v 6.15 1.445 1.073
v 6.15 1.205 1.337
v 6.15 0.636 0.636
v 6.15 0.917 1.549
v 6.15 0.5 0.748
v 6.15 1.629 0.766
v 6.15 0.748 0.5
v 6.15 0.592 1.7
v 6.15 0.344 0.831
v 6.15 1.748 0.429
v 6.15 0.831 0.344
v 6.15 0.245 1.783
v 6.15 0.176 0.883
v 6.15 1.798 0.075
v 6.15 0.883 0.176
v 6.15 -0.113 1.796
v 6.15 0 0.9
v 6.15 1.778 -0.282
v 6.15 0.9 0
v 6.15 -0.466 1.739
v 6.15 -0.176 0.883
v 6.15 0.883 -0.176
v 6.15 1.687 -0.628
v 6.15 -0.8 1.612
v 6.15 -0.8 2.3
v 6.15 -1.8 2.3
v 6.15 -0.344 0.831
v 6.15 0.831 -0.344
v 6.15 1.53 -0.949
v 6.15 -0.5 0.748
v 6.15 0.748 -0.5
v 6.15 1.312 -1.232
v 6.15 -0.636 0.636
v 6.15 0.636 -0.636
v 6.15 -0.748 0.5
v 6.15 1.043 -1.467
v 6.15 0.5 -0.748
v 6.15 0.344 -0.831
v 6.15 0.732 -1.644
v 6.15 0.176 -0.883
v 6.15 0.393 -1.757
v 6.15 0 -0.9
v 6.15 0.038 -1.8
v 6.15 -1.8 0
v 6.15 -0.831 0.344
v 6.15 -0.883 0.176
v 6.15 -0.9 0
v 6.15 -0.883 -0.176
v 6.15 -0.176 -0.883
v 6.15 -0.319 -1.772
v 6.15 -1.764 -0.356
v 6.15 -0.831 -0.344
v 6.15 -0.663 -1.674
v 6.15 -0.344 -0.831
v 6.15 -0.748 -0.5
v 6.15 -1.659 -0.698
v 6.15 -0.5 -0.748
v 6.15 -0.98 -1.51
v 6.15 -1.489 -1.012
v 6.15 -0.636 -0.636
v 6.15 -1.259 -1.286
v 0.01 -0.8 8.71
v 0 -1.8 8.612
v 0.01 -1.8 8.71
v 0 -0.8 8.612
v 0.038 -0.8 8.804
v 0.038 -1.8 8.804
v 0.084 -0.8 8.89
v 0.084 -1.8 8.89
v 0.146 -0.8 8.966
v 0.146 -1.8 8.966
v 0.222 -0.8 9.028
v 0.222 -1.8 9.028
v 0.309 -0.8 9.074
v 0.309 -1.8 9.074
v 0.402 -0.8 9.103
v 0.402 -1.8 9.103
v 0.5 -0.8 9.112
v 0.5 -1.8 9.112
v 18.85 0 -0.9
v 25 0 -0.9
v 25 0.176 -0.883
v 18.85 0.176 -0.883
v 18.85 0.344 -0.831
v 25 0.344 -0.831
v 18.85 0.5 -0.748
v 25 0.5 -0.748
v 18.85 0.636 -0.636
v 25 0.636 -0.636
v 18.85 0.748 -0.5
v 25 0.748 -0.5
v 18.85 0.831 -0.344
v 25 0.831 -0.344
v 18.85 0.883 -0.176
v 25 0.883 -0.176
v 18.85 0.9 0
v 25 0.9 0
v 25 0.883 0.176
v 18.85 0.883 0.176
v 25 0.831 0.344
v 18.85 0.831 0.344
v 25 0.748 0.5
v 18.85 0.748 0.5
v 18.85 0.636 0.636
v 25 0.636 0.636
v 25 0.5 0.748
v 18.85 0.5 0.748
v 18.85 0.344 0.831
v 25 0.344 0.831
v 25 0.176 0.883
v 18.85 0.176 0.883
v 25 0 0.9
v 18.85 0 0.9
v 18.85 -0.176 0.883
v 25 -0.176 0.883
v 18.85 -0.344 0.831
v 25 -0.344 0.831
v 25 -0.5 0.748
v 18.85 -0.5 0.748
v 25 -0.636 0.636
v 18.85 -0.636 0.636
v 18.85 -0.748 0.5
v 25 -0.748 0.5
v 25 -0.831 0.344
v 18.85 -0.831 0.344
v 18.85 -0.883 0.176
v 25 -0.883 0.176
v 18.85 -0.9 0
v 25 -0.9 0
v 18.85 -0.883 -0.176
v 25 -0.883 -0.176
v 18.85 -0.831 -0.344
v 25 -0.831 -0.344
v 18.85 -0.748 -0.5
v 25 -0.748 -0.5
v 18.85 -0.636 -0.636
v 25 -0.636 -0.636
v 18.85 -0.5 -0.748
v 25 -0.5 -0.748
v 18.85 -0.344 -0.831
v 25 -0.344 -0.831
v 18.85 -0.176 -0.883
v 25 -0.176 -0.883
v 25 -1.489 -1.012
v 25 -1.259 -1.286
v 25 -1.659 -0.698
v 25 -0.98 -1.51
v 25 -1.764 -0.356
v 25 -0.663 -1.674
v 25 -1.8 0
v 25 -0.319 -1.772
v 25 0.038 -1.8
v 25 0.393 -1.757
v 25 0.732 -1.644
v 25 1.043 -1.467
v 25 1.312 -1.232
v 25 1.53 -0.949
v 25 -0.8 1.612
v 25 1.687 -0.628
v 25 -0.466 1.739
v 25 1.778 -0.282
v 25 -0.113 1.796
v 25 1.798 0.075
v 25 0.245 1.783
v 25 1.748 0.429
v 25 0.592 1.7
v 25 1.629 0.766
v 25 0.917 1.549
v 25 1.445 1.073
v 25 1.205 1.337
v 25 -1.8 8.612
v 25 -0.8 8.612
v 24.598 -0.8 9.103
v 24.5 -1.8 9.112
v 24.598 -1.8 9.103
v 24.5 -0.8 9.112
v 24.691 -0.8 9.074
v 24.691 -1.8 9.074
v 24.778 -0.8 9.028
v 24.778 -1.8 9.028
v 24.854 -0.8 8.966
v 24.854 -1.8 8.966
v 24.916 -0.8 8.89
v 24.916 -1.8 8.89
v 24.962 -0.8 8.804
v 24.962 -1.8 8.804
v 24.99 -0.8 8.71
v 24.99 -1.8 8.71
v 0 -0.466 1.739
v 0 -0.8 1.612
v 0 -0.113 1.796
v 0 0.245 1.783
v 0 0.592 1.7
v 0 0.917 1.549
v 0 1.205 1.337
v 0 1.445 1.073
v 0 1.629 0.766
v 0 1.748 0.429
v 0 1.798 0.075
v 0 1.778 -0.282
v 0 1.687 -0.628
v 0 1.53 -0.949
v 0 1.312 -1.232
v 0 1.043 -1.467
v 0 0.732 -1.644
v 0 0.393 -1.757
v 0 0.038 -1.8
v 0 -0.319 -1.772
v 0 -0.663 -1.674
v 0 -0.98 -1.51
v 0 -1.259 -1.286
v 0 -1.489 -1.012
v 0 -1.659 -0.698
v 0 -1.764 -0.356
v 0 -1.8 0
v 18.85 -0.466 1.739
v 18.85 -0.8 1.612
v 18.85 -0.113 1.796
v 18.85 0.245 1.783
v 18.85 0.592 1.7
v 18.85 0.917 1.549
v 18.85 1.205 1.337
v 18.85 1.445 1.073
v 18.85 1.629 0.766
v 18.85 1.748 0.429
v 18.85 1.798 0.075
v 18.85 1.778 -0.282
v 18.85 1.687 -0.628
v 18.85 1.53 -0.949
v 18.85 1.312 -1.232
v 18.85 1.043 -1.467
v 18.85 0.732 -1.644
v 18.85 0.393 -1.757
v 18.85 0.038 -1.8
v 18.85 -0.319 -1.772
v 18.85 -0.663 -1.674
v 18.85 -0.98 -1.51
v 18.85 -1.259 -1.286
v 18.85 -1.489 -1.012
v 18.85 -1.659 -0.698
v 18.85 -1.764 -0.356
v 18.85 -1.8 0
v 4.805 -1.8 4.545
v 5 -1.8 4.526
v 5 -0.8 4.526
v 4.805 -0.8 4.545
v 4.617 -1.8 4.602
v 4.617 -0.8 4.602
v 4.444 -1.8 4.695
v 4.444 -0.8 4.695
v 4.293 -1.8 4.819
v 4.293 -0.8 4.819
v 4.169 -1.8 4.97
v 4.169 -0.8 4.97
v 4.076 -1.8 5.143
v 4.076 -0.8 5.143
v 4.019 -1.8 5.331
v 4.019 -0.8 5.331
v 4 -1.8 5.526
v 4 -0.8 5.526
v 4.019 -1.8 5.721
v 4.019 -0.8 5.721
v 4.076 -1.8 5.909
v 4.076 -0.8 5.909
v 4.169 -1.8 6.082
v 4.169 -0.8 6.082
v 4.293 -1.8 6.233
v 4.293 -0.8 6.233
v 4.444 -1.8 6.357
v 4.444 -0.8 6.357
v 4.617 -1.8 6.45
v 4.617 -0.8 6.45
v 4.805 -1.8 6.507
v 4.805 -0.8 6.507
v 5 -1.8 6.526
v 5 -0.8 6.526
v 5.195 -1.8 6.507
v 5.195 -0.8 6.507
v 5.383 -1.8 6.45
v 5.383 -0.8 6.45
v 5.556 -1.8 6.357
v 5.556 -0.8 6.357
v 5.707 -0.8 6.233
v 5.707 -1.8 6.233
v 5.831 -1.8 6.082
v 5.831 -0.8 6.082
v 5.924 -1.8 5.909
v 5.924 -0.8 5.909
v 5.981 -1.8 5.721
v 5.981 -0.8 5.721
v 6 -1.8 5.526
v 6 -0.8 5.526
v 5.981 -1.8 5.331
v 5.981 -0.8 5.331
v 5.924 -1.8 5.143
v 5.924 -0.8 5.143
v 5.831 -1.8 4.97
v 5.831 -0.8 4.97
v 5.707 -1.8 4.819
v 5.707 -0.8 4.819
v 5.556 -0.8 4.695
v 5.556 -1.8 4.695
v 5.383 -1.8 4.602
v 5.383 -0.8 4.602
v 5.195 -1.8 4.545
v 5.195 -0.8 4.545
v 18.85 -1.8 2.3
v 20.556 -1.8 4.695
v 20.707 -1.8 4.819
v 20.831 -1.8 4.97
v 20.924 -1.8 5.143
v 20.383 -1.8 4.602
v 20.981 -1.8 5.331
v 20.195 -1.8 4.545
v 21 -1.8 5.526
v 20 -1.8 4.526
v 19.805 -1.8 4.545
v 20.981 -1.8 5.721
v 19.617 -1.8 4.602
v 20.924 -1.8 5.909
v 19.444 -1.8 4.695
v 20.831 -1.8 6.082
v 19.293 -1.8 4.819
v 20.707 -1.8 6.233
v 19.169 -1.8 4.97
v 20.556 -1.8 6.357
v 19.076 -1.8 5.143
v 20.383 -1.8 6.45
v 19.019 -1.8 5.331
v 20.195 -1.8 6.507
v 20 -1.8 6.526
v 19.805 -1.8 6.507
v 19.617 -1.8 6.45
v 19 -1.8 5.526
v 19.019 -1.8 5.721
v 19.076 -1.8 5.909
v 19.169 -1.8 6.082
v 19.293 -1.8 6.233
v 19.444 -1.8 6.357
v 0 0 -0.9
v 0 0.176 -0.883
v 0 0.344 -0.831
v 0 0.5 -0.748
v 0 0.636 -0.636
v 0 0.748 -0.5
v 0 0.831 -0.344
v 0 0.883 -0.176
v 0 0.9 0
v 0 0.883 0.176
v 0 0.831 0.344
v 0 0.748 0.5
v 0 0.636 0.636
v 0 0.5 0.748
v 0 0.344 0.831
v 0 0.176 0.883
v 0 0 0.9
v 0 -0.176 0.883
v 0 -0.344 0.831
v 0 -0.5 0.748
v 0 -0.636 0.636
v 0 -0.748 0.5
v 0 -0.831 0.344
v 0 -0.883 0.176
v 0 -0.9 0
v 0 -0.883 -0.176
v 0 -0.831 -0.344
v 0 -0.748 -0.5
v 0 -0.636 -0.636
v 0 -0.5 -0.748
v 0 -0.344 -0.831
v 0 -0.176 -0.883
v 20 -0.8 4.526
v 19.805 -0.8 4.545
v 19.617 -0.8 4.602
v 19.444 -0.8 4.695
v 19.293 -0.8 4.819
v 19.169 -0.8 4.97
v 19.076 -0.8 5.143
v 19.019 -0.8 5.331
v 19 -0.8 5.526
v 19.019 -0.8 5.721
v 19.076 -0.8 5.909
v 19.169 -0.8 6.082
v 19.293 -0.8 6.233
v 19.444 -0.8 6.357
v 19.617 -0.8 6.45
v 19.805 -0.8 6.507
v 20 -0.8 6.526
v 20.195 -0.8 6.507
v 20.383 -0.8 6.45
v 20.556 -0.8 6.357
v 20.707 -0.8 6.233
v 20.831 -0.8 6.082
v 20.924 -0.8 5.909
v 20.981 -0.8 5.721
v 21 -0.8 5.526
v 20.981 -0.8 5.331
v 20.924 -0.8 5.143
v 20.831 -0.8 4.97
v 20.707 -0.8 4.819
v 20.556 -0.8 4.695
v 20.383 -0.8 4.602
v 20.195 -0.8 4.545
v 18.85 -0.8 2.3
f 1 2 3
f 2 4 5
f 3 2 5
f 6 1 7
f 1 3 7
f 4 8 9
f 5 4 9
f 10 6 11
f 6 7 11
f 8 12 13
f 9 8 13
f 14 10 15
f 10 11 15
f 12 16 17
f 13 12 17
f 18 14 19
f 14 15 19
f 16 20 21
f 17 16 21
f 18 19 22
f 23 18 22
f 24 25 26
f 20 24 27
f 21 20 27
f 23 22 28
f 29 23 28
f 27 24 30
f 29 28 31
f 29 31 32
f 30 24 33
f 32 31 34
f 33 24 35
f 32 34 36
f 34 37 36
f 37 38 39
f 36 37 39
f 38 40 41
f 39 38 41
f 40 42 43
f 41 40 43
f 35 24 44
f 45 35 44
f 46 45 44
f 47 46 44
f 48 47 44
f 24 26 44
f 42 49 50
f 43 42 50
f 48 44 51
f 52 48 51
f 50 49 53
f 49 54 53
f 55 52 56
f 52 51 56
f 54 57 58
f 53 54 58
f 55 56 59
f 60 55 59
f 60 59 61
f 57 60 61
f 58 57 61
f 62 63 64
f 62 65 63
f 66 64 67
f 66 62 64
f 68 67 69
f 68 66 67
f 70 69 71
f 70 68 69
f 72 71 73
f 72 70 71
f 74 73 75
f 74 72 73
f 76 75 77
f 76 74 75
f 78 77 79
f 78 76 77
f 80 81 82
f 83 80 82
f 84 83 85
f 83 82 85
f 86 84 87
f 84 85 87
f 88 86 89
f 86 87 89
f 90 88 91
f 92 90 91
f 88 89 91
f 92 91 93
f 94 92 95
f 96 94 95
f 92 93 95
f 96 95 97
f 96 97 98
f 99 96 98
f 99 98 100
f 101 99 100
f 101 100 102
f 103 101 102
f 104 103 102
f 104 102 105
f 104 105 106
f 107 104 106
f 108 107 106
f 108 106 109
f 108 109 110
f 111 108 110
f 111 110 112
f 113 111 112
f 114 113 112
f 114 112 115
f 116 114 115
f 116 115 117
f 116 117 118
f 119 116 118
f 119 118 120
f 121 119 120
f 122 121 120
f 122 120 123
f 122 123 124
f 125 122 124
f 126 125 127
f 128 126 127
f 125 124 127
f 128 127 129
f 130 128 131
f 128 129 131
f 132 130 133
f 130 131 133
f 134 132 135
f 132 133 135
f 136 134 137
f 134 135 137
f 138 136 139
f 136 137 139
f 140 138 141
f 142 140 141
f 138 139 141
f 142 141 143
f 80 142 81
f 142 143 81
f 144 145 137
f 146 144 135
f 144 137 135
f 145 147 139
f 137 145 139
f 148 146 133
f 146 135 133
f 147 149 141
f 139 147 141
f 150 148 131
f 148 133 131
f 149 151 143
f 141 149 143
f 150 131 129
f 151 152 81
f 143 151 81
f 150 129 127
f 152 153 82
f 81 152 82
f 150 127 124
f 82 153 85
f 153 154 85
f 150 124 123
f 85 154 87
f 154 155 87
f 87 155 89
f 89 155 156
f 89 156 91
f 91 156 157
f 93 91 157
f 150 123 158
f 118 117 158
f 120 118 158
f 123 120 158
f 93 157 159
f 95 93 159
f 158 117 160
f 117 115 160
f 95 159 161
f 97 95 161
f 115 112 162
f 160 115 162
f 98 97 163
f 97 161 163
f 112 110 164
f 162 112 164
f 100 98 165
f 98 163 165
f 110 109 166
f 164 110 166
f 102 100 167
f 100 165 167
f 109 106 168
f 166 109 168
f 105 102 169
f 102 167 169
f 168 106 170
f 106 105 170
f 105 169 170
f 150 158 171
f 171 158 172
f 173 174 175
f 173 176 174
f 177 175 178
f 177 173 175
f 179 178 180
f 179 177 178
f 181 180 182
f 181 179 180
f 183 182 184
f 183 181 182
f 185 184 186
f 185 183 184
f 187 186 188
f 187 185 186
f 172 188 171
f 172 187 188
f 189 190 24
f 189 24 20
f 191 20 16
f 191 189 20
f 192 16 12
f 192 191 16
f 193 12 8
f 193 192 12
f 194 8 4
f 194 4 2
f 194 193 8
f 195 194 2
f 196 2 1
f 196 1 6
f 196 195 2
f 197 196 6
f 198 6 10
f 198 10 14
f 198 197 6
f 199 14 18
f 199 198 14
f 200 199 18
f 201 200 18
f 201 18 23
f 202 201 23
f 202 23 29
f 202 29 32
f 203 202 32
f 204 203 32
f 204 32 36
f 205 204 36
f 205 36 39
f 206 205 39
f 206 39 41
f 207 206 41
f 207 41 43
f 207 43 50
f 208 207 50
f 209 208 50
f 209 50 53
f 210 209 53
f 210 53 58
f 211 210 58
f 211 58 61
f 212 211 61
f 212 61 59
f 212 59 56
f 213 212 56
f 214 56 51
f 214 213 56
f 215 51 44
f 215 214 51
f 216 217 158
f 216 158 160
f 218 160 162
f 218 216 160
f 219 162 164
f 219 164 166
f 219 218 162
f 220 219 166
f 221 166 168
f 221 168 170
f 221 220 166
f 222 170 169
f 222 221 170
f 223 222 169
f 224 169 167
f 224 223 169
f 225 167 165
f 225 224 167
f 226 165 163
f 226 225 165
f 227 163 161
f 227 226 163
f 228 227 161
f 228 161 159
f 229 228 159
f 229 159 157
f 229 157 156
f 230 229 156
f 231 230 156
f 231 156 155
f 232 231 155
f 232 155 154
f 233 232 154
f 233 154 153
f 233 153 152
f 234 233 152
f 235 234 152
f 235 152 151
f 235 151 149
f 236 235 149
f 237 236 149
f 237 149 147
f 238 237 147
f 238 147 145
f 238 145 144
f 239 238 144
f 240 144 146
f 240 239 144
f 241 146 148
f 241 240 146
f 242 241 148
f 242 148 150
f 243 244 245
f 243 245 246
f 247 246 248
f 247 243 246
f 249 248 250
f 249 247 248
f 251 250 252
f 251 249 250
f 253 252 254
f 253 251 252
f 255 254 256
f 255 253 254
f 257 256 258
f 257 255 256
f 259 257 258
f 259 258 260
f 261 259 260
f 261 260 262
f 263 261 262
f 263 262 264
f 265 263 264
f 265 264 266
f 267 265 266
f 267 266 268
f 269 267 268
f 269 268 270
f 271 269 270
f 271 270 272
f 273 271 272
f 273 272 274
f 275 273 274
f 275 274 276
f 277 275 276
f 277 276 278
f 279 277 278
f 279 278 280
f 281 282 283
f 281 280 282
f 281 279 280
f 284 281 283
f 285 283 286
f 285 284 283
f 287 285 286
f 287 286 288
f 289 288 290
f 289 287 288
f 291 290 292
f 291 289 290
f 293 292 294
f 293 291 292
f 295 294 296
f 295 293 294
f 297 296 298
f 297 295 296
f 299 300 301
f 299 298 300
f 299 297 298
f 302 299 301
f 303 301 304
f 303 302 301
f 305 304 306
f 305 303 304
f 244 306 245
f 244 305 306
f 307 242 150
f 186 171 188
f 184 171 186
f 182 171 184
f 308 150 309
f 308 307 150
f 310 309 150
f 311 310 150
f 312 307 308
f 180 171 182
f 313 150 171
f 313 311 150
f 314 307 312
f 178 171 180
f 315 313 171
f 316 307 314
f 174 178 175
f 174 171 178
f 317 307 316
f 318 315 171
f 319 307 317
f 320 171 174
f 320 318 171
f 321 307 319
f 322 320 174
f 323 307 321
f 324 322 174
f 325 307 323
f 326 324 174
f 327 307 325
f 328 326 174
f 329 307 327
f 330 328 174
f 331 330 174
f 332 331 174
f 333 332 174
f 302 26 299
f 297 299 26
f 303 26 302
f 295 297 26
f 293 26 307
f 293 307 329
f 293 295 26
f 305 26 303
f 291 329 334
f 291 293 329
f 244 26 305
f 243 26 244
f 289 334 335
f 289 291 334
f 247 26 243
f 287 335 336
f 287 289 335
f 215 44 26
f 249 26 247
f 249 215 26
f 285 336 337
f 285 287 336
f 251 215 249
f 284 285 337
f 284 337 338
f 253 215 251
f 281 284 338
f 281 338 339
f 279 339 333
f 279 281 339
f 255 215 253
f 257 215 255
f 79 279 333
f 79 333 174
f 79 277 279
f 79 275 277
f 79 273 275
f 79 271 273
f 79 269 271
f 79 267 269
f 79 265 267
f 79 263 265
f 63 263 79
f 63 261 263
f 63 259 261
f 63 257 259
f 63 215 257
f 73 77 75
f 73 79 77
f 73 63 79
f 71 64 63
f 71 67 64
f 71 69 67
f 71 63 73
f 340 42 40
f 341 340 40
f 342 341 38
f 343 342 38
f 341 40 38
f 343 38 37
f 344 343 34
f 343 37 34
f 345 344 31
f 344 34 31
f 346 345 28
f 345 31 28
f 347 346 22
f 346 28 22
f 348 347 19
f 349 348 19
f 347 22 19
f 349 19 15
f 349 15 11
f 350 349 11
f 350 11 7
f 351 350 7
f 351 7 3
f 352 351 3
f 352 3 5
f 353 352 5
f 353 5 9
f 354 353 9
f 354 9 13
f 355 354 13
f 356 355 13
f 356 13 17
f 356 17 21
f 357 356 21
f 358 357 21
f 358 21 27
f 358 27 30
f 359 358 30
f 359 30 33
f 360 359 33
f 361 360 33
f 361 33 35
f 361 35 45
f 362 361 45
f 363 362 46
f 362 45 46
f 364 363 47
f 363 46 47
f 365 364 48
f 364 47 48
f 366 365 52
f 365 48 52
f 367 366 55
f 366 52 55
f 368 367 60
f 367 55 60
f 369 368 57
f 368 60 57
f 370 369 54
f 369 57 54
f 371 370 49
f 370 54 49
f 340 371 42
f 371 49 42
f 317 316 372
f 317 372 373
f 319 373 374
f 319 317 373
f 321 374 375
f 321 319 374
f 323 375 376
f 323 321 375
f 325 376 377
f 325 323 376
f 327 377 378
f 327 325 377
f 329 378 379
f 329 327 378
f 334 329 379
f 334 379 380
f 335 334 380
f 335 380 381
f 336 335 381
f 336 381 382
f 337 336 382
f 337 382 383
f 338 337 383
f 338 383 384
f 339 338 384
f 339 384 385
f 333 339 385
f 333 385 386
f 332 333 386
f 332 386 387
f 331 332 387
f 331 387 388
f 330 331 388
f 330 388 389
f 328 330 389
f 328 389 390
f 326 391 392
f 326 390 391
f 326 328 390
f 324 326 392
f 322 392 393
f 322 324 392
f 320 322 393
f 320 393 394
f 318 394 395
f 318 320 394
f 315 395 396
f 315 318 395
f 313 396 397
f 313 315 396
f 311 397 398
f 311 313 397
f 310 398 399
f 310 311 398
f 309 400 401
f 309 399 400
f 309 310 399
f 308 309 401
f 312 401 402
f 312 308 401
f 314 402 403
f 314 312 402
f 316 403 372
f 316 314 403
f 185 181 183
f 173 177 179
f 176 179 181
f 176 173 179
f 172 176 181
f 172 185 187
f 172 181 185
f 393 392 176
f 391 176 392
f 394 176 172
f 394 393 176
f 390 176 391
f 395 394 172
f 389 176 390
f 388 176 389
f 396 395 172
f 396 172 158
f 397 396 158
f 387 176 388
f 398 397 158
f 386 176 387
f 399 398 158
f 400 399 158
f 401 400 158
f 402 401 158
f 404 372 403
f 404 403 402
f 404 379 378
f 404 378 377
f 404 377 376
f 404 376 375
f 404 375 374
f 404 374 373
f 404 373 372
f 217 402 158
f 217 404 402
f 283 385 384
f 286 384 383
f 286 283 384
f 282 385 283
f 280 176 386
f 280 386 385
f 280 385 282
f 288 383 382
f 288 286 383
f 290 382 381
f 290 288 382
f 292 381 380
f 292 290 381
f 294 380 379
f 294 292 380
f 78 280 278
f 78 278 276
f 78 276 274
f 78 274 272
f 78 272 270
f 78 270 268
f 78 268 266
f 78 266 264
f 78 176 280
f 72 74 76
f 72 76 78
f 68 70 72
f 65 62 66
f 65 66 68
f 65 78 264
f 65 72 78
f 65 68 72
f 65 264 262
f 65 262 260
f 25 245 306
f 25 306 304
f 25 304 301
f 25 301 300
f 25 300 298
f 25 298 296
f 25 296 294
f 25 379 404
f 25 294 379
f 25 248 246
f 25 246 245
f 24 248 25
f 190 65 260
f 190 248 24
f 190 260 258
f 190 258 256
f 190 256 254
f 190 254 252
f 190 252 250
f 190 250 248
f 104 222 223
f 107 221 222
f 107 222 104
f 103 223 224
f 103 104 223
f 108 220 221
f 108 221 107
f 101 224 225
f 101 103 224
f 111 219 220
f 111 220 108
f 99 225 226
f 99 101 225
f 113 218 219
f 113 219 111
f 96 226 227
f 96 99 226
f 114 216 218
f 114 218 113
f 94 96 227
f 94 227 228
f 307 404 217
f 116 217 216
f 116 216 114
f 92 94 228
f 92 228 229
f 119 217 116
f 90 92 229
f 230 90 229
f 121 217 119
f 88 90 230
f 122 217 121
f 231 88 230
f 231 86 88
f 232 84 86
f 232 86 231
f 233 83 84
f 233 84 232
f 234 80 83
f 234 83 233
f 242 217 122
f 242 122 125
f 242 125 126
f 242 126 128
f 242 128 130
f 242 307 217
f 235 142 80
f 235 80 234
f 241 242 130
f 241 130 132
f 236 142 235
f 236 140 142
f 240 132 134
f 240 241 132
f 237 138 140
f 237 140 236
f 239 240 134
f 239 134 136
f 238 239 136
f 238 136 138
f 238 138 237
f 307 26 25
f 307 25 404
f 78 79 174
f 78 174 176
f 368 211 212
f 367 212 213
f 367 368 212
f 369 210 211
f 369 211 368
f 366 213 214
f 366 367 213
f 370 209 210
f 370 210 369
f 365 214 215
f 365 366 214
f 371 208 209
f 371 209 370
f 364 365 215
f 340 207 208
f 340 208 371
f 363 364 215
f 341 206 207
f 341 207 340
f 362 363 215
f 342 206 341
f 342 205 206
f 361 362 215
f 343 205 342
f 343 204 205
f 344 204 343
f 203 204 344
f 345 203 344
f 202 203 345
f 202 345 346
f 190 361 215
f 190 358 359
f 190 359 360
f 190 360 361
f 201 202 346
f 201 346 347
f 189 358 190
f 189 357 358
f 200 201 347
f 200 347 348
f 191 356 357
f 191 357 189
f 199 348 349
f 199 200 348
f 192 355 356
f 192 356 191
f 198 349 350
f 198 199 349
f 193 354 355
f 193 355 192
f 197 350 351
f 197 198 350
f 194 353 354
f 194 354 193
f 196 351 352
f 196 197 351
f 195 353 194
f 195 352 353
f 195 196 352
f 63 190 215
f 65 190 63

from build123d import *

# Parameters (mm, degrees)
BOSS_EXTRUDE1_DEPTH     = 25
CUT_EXTRUDE1_DEPTH      = 25
CUT_EXTRUDE1_DEPTH_BACK = 25
SKETCH4_R               = 0.9
CUT_EXTRUDE2_DEPTH      = 25
FILLET1_R               = 0.5
CUT_EXTRUDE3_DEPTH      = 25
CUT_EXTRUDE3_DEPTH_BACK = 25
SKETCH5_R               = 1


with BuildPart() as part:
    # Sketch2 → Boss-Extrude1 (new body)
    with BuildSketch(Plane(origin=(0, 0, 0), x_dir=(0, 0, -1), z_dir=(1, 0, 0))):
        with BuildLine():
            Line((0, -1.8), (-9.11245155, -1.8))
            Line((-9.11245155, -1.8), (-9.11245155, -0.8))
            Line((-9.11245155, -0.8), (-1.61245155, -0.8))
            ThreePointArc((-1.61245155, -0.8), (0.948683298, 1.529705854), (0, -1.8))
        make_face()
    extrude(amount=BOSS_EXTRUDE1_DEPTH)

    # Sketch3 → Cut-Extrude1 (cut, two sides: drawn at the far end of the back side and taken through both)
    with BuildSketch(Plane(origin=(0, 0, 0), x_dir=(1, 0, 0), z_dir=(0, 1, 0)).offset(-CUT_EXTRUDE1_DEPTH_BACK)):
        Polygon((18.85, 2.515210703), (6.15, 2.515210703), (6.15, -2.3), (12.5, -2.3), (18.85, -2.3), align=None)
    extrude(amount=CUT_EXTRUDE1_DEPTH + CUT_EXTRUDE1_DEPTH_BACK, mode=Mode.SUBTRACT)

    # Sketch4 → Cut-Extrude2 (cut)
    with BuildSketch(Plane(origin=(25, 0, 0), x_dir=(0, 0, -1), z_dir=(1, 0, 0))):
        Circle(SKETCH4_R)
    extrude(amount=-CUT_EXTRUDE2_DEPTH, mode=Mode.SUBTRACT)

    # Fillet1
    fillet1_edges = [part.edges().sort_by_distance(p)[0] for p in [
        (0, -1.3, 9.11245155),
        (25, -1.3, 9.11245155),
    ]]
    fillet(fillet1_edges, radius=FILLET1_R)

    # Sketch5 → Cut-Extrude3 (cut, two sides: drawn at the far end of the back side and taken through both)
    with BuildSketch(Plane(origin=(0, 0, 0), x_dir=(1, 0, 0), z_dir=(0, 1, 0)).offset(-CUT_EXTRUDE3_DEPTH_BACK)):
        with Locations((5, -5.525991782)):
            Circle(SKETCH5_R)
        with Locations((20, -5.525991782)):
            Circle(SKETCH5_R)
    extrude(amount=CUT_EXTRUDE3_DEPTH + CUT_EXTRUDE3_DEPTH_BACK, mode=Mode.SUBTRACT)


solid = part.part
